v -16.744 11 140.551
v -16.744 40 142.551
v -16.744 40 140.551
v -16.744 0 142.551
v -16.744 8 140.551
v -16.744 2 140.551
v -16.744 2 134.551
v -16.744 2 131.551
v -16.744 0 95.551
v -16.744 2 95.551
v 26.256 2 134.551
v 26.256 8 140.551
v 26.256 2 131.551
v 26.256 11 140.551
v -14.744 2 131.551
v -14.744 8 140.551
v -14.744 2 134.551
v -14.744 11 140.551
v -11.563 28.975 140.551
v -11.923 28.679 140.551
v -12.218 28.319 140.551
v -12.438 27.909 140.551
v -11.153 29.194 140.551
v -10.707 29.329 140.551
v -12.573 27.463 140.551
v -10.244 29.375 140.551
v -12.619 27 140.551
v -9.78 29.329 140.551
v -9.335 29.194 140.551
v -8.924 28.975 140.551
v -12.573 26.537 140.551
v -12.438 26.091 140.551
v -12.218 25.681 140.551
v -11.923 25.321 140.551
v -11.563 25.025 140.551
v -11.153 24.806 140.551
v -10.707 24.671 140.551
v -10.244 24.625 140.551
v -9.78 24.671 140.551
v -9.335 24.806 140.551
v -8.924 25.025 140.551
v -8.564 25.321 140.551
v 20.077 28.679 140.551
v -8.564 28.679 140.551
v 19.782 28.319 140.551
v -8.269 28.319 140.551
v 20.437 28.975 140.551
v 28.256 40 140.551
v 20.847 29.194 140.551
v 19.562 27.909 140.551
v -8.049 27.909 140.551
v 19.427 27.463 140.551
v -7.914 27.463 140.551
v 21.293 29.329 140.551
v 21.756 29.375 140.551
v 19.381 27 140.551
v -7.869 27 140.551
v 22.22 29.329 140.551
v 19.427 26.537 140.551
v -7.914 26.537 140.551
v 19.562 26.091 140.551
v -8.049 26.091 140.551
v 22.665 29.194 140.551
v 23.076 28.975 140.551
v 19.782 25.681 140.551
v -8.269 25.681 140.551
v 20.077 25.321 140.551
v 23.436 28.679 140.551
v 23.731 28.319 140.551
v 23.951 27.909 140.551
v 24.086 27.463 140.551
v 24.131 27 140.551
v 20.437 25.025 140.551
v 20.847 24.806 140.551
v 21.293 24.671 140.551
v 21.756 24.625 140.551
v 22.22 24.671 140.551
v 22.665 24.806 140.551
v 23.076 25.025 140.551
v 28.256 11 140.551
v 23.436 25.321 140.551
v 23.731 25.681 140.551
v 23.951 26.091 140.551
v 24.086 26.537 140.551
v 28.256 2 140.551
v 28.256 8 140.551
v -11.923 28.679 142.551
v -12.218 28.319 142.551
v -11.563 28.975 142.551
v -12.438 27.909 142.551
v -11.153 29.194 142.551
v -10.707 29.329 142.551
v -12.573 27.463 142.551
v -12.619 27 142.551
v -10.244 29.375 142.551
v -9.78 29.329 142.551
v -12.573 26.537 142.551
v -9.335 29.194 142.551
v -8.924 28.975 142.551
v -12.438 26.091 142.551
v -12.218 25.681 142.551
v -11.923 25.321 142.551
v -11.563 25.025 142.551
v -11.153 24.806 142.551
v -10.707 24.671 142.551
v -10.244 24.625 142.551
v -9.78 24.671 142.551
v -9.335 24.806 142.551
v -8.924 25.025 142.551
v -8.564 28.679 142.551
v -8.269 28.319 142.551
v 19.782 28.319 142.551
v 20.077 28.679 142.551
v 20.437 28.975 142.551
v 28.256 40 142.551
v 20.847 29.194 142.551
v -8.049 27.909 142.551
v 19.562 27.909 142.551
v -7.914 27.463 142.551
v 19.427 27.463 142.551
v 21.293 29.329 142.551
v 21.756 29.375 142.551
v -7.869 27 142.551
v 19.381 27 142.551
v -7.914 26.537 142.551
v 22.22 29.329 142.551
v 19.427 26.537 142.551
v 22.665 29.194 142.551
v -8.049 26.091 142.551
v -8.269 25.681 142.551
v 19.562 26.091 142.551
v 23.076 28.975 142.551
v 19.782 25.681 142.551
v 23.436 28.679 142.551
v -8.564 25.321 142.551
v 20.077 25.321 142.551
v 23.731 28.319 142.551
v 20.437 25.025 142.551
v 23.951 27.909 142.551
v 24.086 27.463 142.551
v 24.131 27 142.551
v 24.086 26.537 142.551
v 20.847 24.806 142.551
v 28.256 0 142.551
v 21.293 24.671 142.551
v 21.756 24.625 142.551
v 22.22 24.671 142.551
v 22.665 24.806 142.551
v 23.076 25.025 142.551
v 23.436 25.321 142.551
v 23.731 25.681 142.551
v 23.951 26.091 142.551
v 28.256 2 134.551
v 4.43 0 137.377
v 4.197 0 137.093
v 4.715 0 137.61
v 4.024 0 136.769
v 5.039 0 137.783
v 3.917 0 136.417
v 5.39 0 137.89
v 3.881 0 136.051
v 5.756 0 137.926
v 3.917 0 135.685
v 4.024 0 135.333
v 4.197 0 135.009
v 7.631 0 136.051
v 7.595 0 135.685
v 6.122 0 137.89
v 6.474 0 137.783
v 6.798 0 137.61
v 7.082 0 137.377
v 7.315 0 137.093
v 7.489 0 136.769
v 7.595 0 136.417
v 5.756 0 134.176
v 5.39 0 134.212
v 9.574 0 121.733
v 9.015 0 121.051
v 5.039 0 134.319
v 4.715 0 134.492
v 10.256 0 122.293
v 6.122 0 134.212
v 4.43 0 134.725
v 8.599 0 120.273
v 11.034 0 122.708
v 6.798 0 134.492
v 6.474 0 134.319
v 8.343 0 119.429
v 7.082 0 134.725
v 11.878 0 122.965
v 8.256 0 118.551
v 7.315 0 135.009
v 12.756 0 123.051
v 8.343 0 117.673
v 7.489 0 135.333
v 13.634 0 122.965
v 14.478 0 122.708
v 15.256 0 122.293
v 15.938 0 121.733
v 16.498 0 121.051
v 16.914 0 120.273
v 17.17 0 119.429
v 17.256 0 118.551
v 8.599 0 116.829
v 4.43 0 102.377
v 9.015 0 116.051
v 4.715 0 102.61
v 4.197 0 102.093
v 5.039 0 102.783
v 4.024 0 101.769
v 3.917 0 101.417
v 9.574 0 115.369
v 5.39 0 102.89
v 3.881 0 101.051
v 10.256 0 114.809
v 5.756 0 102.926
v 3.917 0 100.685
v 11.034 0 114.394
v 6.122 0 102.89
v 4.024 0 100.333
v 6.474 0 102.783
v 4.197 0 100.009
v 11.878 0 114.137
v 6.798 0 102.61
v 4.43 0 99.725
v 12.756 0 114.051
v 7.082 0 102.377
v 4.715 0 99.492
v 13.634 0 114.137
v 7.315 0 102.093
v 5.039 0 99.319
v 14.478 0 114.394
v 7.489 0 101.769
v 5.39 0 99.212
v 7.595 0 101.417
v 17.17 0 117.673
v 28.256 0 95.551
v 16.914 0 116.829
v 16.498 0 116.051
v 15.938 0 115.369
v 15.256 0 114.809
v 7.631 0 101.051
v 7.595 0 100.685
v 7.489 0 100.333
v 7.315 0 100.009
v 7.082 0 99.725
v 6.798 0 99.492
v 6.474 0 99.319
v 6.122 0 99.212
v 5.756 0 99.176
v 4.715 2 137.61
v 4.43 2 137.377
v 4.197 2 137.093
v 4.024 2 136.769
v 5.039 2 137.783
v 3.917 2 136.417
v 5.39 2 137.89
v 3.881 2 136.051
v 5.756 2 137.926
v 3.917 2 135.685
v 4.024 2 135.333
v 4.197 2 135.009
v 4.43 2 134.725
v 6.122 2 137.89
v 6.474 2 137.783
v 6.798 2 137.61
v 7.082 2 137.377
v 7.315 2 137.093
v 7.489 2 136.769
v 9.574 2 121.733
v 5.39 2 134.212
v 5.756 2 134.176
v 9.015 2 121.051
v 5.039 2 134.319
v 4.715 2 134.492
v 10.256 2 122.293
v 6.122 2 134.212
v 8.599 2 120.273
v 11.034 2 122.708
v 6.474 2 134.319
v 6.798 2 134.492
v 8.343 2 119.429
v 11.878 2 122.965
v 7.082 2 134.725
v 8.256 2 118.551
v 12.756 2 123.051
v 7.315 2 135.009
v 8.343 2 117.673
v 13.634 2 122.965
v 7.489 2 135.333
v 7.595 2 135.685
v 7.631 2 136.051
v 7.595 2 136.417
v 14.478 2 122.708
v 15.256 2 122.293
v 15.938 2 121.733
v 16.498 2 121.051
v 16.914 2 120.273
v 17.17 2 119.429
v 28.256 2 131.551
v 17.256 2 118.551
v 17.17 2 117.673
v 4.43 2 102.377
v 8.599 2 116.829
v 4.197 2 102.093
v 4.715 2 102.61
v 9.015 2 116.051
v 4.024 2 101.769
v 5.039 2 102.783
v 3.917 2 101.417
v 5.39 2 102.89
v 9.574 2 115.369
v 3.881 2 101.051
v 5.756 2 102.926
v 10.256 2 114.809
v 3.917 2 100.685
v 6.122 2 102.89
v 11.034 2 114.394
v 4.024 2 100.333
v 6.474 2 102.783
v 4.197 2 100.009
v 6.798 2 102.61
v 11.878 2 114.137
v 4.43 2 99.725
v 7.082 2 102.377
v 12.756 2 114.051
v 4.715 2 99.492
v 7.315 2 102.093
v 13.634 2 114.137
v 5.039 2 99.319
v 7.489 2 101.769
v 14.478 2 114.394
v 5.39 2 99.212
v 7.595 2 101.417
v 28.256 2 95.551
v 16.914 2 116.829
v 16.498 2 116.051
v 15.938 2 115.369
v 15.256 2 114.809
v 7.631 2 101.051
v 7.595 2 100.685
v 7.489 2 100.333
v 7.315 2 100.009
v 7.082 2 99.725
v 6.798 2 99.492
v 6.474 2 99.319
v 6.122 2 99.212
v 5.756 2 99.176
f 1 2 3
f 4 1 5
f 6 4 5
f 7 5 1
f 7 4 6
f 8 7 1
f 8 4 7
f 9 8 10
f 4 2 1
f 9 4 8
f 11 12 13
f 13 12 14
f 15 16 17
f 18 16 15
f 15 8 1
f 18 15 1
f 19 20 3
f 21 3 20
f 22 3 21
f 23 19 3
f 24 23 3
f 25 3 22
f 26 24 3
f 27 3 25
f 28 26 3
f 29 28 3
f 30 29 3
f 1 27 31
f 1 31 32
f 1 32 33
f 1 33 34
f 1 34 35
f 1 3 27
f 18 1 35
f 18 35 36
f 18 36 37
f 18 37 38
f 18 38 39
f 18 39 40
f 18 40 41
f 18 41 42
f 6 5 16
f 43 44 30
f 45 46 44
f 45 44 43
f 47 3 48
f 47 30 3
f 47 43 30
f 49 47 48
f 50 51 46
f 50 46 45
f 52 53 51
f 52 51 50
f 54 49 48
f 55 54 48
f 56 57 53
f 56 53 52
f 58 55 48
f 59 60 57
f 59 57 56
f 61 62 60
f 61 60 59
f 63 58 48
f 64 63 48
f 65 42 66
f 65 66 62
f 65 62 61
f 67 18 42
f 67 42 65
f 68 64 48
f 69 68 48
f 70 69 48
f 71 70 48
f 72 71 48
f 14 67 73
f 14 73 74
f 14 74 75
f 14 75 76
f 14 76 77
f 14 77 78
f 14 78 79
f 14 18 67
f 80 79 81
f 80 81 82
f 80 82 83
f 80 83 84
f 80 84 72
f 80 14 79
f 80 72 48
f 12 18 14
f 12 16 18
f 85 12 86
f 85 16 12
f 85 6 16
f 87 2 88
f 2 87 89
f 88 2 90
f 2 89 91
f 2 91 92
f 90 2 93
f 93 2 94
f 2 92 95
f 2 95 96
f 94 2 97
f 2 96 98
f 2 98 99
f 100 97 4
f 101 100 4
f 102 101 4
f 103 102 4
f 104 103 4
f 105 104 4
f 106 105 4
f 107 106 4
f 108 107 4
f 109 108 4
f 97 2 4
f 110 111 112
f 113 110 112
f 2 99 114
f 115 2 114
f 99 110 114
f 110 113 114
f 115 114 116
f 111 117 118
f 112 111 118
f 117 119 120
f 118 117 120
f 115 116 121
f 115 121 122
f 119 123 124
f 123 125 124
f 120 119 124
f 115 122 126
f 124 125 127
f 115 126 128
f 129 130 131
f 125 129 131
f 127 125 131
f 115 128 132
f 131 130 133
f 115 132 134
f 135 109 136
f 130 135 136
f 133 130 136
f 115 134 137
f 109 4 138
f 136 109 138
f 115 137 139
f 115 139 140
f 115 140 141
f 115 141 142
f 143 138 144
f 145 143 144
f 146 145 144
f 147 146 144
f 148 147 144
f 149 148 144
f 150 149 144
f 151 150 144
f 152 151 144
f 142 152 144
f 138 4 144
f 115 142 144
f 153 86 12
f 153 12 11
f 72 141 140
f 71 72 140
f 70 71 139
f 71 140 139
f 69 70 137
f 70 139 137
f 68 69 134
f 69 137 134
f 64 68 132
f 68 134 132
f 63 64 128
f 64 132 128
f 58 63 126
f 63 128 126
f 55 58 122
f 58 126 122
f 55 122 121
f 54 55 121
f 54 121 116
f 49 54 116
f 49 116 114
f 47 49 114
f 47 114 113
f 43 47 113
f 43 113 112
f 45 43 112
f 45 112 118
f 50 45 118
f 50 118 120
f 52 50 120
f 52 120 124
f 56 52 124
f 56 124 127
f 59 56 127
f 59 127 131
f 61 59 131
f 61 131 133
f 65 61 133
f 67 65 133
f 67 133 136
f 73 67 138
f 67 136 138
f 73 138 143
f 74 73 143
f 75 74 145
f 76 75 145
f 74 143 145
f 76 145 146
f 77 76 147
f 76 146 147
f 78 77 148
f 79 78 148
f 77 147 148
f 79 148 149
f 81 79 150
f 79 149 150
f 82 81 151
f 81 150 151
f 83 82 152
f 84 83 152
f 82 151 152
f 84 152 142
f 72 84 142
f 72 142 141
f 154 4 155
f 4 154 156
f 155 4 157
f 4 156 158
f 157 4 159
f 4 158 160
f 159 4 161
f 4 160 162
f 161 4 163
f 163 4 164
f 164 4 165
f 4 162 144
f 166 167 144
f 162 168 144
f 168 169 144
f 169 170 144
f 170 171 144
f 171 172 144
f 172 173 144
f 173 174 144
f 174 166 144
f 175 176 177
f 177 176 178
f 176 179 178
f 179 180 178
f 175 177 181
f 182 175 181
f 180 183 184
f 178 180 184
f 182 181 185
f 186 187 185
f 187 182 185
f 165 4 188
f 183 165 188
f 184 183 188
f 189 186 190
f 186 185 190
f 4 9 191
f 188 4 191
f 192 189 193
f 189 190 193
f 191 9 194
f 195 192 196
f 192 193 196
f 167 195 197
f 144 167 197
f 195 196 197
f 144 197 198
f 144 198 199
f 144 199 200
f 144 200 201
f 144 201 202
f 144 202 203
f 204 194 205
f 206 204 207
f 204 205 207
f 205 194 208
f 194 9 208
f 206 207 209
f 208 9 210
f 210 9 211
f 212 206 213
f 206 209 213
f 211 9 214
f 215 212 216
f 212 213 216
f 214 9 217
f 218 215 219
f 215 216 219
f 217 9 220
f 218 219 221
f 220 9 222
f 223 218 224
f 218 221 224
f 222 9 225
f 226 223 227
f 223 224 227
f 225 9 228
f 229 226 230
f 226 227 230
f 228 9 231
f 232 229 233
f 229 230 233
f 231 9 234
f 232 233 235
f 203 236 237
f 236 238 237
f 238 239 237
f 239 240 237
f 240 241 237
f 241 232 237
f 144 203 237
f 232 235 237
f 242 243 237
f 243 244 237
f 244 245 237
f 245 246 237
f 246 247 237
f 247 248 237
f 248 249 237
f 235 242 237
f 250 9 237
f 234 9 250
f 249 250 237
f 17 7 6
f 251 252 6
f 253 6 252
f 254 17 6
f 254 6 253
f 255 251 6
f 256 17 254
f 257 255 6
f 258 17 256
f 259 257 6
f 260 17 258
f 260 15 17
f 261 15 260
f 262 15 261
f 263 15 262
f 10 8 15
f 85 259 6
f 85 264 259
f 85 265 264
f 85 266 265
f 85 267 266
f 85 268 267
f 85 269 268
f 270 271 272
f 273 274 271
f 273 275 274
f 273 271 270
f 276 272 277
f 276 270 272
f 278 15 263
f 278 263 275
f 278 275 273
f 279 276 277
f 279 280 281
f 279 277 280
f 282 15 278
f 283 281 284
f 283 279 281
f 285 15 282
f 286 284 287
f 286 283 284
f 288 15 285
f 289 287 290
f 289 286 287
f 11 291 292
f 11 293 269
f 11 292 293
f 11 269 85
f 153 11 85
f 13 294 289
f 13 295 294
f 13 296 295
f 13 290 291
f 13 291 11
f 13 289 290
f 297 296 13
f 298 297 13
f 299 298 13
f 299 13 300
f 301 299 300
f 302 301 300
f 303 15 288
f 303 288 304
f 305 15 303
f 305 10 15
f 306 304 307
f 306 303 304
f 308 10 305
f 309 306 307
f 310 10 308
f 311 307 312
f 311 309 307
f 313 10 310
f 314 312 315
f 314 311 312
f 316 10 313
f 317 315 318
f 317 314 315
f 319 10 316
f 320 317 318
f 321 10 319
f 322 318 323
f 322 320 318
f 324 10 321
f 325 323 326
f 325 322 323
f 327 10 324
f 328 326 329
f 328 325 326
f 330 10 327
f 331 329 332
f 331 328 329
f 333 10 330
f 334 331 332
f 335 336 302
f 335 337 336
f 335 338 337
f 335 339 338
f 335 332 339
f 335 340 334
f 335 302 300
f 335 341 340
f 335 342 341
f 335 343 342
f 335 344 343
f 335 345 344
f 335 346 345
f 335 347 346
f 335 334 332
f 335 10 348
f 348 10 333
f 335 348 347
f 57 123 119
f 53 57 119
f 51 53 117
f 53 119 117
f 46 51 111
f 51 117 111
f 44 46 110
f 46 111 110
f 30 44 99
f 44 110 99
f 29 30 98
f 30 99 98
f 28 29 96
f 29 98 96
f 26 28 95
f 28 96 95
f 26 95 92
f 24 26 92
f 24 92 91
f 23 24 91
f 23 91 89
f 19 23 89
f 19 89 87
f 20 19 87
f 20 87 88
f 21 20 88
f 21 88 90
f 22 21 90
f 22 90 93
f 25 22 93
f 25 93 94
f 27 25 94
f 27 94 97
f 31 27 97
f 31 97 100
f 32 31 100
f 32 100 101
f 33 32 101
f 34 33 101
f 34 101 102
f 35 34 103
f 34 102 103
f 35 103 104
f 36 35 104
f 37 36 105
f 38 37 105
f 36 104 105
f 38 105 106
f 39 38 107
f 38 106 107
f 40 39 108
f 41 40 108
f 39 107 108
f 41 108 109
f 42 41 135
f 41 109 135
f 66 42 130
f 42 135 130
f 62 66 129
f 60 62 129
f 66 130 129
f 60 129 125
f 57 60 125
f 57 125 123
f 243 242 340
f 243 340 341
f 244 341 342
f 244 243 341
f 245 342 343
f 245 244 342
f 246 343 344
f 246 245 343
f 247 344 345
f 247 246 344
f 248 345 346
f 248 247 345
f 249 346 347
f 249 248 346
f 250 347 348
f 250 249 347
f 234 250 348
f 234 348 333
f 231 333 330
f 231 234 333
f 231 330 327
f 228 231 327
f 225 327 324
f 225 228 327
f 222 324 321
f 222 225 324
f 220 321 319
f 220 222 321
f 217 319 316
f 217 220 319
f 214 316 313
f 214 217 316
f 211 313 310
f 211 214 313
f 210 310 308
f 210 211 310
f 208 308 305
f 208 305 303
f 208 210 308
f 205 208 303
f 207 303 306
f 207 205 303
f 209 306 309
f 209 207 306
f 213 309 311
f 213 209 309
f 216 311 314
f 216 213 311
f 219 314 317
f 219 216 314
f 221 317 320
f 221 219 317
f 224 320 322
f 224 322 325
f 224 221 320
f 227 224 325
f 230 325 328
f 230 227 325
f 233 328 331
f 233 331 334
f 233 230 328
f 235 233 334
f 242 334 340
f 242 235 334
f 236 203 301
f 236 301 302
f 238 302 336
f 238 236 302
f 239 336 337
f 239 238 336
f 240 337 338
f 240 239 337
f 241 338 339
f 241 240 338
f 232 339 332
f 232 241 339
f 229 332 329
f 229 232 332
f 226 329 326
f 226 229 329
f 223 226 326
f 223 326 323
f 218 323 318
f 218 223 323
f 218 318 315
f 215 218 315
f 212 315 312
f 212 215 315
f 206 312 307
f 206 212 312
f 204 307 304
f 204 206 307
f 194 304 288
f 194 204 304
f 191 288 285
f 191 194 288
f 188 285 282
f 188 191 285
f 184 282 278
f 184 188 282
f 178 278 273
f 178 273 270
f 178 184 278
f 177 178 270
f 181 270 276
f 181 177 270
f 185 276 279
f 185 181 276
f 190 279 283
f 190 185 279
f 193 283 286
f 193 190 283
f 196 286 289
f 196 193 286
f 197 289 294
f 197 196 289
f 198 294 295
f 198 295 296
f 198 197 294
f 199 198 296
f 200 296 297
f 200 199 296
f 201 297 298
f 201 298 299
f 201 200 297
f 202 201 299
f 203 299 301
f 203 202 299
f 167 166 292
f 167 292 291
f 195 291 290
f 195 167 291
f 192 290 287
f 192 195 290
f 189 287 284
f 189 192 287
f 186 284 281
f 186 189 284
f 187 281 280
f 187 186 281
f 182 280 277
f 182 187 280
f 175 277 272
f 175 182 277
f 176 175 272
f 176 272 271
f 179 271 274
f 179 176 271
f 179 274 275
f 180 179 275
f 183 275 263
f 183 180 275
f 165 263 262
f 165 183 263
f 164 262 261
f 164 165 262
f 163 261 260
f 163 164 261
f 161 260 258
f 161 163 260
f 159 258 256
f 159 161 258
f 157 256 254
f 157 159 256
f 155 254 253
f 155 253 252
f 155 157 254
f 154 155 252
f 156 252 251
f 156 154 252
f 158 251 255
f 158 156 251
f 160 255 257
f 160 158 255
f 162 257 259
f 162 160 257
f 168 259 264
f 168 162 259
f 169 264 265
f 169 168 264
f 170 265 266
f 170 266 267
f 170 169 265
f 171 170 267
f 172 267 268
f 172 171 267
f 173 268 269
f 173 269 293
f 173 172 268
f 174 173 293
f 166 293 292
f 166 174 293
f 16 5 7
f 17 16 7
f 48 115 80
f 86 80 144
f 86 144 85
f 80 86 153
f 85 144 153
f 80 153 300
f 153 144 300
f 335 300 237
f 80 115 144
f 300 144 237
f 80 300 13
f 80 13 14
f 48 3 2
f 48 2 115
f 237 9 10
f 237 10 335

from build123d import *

# Parameters (mm, degrees)
SKETCH7_W           = 45
SKETCH7_H           = 45
SKETCH7_R           = 1.875
SKETCH7_R_2         = 4.5
BOSS_EXTRUDE5_DEPTH = 2
SKETCH7_3_W         = 45
SKETCH7_3_H         = 2
BOSS_EXTRUDE6_DEPTH = 40
BOSS_EXTRUDE7_DEPTH = 2
SKETCH10_R          = 2.375
CUT_EXTRUDE2_DEPTH  = 5


with BuildPart() as part:
    # Sketch7 → Boss-Extrude5 (new body)
    with BuildSketch(Plane(origin=(0, 0, 0), x_dir=(1, 0, 0), z_dir=(0, 1, 0))):
        with Locations((5.756289545, -118.050969126)):
            Rectangle(SKETCH7_W, SKETCH7_H)
        with Locations((5.756289545, -136.050969126)):
            Circle(SKETCH7_R, mode=Mode.SUBTRACT)
        with Locations((5.756289545, -101.050969126)):
            Circle(SKETCH7_R, mode=Mode.SUBTRACT)
        with Locations((12.756289545, -118.550969126)):
            Circle(SKETCH7_R_2, mode=Mode.SUBTRACT)
    extrude(amount=BOSS_EXTRUDE5_DEPTH)

    # Sketch7<3> → Boss-Extrude6 (add)
    with BuildSketch(Plane(origin=(0, 0, 0), x_dir=(1, 0, 0), z_dir=(0, 1, 0))):
        with Locations((5.756289545, -141.550969126)):
            Rectangle(SKETCH7_3_W, SKETCH7_3_H)
    extrude(amount=BOSS_EXTRUDE6_DEPTH)

    # Sketch8 → Boss-Extrude7 (add)
    with BuildSketch(Plane.ZY.offset(16.743710455)):
        Polygon((140.550969126, 8), (134.550969126, 2), (131.550969126, 2), (140.550969126, 11), align=None)
    boss_extrude7 = extrude(amount=-BOSS_EXTRUDE7_DEPTH)

    # Mirror2: Boss-Extrude7 across plane
    add(boss_extrude7.mirror(Plane.ZY.offset(-5.756289545)))

    # Sketch10 → Cut-Extrude2 (cut)
    with BuildSketch(Plane.XY.offset(142.550969126)):
        with Locations((21.756289545, 27)):
            Circle(SKETCH10_R)
        with Locations((-10.243710455, 27)):
            Circle(SKETCH10_R)
    extrude(amount=-CUT_EXTRUDE2_DEPTH, mode=Mode.SUBTRACT)


solid = part.part
